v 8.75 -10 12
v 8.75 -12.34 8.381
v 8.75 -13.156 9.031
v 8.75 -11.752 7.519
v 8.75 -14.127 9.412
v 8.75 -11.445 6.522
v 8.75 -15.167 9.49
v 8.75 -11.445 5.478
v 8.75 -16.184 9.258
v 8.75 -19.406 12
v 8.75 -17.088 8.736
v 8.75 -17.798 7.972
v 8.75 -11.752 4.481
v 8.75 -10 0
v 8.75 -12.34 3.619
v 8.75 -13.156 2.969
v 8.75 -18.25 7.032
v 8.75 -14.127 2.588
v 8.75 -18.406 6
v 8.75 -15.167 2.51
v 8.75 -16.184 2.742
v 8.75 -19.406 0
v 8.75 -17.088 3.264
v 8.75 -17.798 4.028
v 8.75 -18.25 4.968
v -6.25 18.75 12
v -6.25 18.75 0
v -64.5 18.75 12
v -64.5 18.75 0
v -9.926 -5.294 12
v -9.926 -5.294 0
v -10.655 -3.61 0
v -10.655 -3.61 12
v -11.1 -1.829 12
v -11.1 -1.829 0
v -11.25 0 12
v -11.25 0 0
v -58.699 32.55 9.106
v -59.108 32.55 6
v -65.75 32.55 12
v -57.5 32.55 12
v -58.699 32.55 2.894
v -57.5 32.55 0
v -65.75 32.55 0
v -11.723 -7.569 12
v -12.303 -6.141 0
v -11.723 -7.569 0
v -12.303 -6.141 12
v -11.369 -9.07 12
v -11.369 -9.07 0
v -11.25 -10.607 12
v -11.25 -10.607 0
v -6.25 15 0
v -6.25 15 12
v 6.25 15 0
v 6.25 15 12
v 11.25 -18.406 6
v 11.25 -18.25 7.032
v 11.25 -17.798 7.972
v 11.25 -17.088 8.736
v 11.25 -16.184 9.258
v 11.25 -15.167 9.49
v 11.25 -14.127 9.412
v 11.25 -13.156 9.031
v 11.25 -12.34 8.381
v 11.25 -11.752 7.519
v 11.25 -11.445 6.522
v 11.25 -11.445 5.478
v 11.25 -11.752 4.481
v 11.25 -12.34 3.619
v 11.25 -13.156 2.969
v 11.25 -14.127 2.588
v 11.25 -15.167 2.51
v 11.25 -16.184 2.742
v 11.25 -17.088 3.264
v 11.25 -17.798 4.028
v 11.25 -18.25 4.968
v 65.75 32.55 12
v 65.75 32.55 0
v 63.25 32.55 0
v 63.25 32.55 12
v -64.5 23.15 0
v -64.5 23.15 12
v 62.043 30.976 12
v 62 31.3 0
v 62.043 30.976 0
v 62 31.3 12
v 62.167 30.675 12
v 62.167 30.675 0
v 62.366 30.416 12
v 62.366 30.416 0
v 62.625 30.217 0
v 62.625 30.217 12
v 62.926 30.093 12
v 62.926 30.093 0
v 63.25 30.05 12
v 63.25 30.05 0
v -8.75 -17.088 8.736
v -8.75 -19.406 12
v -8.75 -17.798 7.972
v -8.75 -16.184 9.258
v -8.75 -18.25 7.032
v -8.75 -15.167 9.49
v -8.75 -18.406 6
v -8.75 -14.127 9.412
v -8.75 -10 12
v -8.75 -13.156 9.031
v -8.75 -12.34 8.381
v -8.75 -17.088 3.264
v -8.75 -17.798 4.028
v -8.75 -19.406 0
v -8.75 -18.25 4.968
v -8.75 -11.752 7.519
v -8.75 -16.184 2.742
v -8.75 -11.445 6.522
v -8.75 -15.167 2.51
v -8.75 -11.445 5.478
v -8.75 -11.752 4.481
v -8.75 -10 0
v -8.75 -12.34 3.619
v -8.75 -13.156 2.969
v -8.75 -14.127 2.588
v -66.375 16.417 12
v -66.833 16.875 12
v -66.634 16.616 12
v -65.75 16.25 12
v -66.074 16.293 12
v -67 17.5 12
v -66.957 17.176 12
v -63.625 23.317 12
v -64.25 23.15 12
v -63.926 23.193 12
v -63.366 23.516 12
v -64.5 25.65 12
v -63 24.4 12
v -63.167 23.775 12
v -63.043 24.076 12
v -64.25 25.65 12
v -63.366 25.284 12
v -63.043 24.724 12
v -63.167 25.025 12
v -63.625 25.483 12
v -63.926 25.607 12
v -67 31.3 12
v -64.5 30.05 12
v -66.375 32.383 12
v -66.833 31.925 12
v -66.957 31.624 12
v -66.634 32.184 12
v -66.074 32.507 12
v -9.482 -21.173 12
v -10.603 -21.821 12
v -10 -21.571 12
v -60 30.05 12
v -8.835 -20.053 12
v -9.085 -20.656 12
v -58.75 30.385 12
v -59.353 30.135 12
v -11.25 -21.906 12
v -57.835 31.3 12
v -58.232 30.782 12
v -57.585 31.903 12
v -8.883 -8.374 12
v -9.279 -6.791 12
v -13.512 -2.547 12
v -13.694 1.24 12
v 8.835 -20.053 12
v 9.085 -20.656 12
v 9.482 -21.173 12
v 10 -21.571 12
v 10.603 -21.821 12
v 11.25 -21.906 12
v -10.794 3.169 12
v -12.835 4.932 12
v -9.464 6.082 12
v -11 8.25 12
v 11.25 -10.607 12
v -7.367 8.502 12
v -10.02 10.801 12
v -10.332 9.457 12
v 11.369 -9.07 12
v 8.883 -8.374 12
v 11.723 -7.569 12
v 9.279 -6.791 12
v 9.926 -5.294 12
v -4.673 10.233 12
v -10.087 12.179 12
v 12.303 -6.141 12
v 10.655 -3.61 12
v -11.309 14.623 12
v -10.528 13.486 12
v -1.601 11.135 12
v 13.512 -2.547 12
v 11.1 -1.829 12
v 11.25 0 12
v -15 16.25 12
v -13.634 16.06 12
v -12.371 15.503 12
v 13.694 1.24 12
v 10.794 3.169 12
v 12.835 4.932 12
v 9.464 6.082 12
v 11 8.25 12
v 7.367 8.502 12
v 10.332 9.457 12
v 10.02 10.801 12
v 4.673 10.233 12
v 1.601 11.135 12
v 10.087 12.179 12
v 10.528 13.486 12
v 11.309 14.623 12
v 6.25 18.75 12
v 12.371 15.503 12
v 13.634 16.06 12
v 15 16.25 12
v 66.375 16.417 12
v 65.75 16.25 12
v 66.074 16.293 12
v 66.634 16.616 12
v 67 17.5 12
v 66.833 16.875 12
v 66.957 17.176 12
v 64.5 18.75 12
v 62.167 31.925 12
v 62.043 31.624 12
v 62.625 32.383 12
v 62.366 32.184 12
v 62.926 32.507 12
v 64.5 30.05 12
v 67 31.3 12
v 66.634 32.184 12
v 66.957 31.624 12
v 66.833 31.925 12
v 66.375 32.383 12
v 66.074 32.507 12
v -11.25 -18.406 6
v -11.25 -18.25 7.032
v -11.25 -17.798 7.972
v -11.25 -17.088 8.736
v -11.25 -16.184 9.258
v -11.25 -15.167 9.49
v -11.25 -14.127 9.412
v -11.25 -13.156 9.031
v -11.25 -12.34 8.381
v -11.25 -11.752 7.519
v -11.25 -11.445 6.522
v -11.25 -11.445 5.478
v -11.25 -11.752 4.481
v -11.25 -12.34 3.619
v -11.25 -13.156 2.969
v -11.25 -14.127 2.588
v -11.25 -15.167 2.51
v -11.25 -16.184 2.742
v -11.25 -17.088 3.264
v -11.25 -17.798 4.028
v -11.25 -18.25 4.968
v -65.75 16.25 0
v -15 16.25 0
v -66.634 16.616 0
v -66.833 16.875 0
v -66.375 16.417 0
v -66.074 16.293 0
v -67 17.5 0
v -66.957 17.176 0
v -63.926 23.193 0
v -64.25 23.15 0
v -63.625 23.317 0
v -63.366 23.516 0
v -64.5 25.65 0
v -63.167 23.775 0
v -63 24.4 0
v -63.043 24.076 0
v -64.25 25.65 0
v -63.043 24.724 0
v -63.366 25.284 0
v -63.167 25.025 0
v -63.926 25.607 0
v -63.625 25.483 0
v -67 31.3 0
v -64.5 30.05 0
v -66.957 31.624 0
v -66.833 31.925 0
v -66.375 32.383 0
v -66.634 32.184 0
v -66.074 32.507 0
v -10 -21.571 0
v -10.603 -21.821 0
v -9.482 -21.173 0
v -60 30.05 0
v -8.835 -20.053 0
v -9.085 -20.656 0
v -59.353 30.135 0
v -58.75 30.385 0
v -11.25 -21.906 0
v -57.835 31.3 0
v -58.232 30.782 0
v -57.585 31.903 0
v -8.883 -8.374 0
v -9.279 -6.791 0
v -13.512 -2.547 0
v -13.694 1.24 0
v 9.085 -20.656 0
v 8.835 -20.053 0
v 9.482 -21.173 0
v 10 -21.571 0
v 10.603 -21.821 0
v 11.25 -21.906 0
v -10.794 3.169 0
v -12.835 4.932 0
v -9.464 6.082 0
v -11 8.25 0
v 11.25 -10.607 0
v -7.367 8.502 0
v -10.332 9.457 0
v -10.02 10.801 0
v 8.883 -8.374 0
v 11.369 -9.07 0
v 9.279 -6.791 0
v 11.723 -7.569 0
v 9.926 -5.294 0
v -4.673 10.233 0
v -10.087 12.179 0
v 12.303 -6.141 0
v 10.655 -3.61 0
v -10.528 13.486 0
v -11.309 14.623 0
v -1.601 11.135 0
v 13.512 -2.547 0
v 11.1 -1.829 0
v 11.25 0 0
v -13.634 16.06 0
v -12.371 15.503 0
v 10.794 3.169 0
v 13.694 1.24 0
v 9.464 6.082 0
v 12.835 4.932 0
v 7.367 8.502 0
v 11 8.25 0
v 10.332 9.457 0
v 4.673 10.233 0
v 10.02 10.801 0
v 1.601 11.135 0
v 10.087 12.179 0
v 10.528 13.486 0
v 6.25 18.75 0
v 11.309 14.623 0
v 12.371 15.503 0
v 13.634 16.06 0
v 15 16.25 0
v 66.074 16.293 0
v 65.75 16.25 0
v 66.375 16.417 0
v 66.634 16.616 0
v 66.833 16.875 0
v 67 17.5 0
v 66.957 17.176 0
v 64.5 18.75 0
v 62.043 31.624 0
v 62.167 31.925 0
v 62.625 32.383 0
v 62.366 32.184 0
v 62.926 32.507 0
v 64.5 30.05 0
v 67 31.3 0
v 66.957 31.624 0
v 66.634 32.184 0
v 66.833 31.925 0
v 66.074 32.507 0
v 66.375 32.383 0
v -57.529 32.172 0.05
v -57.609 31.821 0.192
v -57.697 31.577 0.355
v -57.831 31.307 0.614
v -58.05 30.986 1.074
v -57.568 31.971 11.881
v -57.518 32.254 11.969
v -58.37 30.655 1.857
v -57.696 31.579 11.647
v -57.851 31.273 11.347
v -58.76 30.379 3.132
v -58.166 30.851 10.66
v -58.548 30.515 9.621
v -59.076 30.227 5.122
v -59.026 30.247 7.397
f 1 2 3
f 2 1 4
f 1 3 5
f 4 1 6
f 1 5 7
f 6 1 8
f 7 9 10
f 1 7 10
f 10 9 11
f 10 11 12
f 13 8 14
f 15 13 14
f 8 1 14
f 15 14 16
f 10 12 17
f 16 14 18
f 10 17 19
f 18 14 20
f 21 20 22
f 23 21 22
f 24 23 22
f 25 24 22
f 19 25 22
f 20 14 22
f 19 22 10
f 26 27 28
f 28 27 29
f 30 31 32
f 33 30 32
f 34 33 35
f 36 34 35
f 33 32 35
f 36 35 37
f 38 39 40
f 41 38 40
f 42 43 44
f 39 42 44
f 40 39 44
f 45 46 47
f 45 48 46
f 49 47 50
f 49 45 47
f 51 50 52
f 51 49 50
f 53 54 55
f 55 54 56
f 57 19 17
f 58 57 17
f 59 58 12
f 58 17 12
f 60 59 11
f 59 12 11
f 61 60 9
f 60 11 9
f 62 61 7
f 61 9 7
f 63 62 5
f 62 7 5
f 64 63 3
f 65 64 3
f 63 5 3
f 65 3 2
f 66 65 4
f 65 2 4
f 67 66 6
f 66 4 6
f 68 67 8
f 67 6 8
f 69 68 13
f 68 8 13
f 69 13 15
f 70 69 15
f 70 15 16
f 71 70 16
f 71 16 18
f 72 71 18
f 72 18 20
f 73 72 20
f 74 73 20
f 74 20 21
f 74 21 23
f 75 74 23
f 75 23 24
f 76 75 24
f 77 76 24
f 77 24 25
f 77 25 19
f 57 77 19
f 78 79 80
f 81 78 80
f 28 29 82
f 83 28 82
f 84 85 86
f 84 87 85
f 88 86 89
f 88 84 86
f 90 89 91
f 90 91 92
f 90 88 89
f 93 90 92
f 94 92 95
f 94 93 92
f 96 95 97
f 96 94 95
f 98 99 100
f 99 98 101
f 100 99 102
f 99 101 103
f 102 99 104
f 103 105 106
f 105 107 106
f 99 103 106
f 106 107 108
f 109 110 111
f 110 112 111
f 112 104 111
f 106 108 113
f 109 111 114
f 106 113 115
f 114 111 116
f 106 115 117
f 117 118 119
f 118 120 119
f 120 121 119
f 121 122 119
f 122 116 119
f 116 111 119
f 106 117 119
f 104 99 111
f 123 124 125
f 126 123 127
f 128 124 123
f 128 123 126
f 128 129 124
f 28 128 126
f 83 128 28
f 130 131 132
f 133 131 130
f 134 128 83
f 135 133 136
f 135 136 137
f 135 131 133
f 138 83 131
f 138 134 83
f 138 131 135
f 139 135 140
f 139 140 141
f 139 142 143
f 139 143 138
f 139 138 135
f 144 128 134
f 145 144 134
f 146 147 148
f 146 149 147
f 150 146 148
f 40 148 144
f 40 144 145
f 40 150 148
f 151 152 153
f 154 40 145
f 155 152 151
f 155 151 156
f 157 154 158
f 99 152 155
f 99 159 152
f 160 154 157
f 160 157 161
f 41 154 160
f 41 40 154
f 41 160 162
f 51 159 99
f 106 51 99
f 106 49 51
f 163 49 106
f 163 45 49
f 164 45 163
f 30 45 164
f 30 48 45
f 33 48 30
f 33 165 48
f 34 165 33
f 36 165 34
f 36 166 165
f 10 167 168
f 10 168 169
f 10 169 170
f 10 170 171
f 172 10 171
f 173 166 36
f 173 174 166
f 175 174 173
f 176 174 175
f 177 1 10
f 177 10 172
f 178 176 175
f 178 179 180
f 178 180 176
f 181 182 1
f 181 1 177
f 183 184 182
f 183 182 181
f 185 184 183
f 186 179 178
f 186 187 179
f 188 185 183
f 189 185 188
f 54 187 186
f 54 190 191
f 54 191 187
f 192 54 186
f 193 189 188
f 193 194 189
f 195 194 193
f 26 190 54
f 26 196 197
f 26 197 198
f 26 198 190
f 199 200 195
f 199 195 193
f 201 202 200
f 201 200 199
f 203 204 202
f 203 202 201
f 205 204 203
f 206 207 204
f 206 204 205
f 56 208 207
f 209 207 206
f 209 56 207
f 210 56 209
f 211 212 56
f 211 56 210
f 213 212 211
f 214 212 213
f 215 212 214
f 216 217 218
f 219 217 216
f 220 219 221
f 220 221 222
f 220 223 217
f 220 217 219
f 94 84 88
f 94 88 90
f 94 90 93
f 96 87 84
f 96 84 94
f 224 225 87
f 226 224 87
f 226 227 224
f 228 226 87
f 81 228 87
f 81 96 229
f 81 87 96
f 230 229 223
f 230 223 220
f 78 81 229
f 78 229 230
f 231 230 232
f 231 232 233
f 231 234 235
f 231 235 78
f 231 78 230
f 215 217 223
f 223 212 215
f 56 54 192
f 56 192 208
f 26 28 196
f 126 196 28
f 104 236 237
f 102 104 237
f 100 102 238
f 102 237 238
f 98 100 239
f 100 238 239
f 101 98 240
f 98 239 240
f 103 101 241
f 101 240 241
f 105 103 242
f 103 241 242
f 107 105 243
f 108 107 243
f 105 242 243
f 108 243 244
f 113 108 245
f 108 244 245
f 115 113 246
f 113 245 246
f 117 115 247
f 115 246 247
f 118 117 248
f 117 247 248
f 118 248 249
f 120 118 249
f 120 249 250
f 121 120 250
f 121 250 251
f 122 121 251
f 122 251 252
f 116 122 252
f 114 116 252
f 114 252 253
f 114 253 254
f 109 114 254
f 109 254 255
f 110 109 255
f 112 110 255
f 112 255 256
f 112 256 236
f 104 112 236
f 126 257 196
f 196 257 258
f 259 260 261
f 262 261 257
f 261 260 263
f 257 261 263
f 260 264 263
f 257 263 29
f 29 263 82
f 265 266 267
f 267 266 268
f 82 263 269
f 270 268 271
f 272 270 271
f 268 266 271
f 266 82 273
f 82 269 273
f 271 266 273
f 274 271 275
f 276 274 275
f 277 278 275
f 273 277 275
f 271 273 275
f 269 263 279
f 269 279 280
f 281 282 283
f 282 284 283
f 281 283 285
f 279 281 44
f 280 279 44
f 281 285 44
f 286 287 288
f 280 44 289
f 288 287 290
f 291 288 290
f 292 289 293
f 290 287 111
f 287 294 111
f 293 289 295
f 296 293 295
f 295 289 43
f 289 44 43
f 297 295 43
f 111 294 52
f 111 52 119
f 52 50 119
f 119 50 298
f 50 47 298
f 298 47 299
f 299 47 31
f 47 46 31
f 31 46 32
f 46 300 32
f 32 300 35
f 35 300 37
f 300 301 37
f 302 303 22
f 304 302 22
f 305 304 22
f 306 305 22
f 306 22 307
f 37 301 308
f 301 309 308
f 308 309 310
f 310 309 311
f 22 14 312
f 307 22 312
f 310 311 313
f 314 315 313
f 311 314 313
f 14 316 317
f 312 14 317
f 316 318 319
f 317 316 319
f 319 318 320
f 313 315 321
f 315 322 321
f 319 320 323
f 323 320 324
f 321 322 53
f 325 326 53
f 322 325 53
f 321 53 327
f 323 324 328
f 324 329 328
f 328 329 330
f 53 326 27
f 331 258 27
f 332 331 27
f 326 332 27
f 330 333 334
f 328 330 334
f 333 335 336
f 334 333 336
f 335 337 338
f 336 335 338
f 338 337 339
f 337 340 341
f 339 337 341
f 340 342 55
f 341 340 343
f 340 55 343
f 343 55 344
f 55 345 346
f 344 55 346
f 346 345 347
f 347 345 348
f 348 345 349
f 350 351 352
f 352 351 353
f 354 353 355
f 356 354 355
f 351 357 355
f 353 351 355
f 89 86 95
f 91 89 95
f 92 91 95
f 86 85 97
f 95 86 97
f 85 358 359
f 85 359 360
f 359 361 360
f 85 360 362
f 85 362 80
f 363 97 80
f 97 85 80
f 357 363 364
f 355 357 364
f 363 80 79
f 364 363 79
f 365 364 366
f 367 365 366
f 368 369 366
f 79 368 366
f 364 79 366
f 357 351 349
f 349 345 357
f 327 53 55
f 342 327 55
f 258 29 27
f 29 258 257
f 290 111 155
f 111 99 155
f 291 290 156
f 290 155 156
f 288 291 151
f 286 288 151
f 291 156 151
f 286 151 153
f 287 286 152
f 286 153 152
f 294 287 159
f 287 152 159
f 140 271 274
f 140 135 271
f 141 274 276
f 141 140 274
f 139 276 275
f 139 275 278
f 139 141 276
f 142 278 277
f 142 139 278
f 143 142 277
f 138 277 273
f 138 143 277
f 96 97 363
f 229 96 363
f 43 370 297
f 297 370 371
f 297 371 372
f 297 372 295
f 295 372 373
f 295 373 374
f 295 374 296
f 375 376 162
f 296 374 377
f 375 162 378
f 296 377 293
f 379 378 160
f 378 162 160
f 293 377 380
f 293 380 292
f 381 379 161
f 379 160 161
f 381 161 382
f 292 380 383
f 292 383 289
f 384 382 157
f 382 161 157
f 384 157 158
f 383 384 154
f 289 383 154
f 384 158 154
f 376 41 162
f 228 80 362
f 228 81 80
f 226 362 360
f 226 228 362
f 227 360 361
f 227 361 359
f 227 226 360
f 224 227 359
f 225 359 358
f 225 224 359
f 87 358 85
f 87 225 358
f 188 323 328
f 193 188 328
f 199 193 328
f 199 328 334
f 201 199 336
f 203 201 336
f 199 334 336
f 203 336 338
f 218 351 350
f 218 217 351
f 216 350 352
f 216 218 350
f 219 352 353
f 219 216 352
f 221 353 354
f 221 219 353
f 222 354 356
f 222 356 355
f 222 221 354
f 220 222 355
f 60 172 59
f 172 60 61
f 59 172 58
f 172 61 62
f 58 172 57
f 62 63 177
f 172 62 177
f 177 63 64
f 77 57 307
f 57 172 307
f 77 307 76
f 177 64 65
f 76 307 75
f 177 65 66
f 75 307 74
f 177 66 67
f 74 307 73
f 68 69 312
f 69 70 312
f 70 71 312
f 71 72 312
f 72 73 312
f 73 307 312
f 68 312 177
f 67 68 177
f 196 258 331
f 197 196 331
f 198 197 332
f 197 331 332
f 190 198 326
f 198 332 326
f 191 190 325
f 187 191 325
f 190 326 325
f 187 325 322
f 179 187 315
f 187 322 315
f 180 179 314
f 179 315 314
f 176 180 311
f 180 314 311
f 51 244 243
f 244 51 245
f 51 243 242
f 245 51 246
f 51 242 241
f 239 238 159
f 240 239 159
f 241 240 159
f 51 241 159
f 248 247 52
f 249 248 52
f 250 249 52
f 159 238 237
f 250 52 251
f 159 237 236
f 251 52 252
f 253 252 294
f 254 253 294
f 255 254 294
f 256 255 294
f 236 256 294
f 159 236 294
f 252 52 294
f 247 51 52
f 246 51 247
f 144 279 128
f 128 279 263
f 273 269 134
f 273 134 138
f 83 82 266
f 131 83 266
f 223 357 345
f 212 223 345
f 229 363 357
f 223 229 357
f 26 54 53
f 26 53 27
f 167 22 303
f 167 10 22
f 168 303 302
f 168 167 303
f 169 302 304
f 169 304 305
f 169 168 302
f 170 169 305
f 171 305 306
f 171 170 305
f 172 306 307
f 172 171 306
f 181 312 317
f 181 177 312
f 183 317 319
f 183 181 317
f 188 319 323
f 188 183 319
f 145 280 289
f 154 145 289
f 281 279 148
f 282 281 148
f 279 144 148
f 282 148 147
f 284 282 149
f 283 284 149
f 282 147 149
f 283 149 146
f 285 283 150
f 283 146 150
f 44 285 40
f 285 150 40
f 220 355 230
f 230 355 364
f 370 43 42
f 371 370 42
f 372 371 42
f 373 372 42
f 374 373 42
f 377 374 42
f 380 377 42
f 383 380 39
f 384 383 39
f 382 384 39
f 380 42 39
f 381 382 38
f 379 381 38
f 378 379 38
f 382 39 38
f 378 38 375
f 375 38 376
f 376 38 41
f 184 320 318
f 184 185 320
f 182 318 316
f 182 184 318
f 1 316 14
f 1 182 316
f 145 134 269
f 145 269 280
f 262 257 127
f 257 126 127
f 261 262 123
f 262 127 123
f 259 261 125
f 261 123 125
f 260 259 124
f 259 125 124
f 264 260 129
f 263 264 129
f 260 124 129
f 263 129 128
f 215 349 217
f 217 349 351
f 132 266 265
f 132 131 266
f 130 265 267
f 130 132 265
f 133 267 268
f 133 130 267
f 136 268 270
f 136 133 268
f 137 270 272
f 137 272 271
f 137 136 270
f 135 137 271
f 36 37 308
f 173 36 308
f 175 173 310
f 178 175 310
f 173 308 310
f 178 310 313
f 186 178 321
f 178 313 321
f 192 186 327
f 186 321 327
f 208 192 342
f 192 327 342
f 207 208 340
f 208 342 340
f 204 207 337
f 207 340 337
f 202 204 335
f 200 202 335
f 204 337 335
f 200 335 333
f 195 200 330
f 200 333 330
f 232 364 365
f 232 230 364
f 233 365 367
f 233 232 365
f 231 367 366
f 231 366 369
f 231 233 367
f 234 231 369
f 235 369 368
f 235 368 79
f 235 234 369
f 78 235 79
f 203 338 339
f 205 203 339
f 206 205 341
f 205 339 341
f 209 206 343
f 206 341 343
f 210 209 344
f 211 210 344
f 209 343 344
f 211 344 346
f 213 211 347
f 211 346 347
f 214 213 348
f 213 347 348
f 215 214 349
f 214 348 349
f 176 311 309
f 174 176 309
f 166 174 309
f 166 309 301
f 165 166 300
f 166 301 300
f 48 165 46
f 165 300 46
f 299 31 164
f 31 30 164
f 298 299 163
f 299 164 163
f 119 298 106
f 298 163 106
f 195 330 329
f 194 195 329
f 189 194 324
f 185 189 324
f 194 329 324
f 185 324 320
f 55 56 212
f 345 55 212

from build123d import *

# Parameters (mm, degrees)
F0_W      = 1.5
F0_H      = 2.5
F1_DEPTH  = 12
F2_R      = 3.5
F3_DEPTH  = 22.5
F4_R      = 10
F5_R      = 2.49999
F6_R      = 1.24999
F7_W      = 12.5
F7_H      = 3.75
F8_DEPTH  = 12
F10_DEPTH = 2.5


# Not quite as in the source:
# - a fillet or chamfer is up to 0.001 mm smaller than in the source, because OpenCascade refuses the exact size


with BuildPart() as f1:
    # F0 (on Top) → F1 (new body)
    with BuildSketch(Plane.XY):
        with BuildLine():
            ThreePointArc((11.25, 0), (10.6066017178, -3.75), (8.75, -7.0710678119))
            Line((8.75, -7.0710678119), (8.75, -10.6066017178))
            ThreePointArc((8.75, -10.6066017178), (10.0907742727, -9.3401699437), (11.25, -7.9056941504))
            Line((11.25, -7.9056941504), (11.25, 0))
        make_face()
        with BuildLine():
            ThreePointArc((-11.25, 0), (0, 11.25), (11.25, 0))
            Line((11.25, 0), (11.25, -7.9056941504))
            ThreePointArc((11.25, -7.9056941504), (13.748354024, 0.2127478073), (11, 8.25))
            ThreePointArc((11, 8.25), (0, 13.75), (-11, 8.25))
            ThreePointArc((-11, 8.25), (-13.748354024, 0.2127478073), (-11.25, -7.9056941504))
            Line((-11.25, -7.9056941504), (-11.25, 0))
        make_face()
        with BuildLine():
            ThreePointArc((11.25, -7.9056941504), (10.0907742727, -9.3401699437), (8.75, -10.6066017178))
            Line((8.75, -10.6066017178), (8.75, -21.9056941504))
            Line((8.75, -21.9056941504), (11.25, -21.9056941504))
            Line((11.25, -21.9056941504), (11.25, -7.9056941504))
        make_face()
        with BuildLine():
            ThreePointArc((-8.75, -7.0710678119), (-10.6066017178, -3.75), (-11.25, 0))
            Line((-11.25, 0), (-11.25, -7.9056941504))
            ThreePointArc((-11.25, -7.9056941504), (-10.0907742727, -9.3401699437), (-8.75, -10.6066017178))
            Line((-8.75, -10.6066017178), (-8.75, -7.0710678119))
        make_face()
        with BuildLine():
            ThreePointArc((-8.75, -10.6066017178), (-10.0907742727, -9.3401699437), (-11.25, -7.9056941504))
            Line((-11.25, -7.9056941504), (-11.25, -21.9056941504))
            Line((-11.25, -21.9056941504), (-8.75, -21.9056941504))
            Line((-8.75, -21.9056941504), (-8.75, -10.6066017178))
        make_face()
        with BuildLine():
            ThreePointArc((-11, 8.25), (0, 13.75), (11, 8.25))
            ThreePointArc((11, 8.25), (10.527864045, 13.4860679775), (15, 16.25))
            Line((15, 16.25), (-15, 16.25))
            ThreePointArc((-15, 16.25), (-10.527864045, 13.4860679775), (-11, 8.25))
        make_face()
        Polygon((-15, 16.25), (15, 16.25), (64.5, 16.25), (64.5, 18.75), (0, 18.75), (-64.5, 18.75), (-64.5, 23.15), (-64.5, 25.65), (-64.5, 30.05), (-67, 30.05), (-67, 16.25), (-64.5, 16.25), align=None)
        Polygon((64.5, 18.75), (64.5, 16.25), (67, 16.25), (67, 30.05), (64.5, 30.05), align=None)
        Polygon((62, 30.05), (64.5, 30.05), (67, 30.05), (67, 32.55), (62, 32.55), align=None)
        Polygon((-67, 32.55), (-67, 30.05), (-64.5, 30.05), (-57.5, 30.05), (-57.5, 32.55), align=None)
        with Locations((-63.75, 24.4)):
            Rectangle(F0_W, F0_H)
    extrude(amount=F1_DEPTH)

    # F2 (on face) → F3 (cut, through all)
    with BuildSketch(Plane(origin=(-11.25, 0, 0), x_dir=(0, -1, 0), z_dir=(-1, 0, 0))):
        with Locations((14.9056941504, 6)):
            Circle(F2_R)
    extrude(amount=-F3_DEPTH, mode=Mode.SUBTRACT)

    # F4
    f4_edges = [f1.edges().sort_by_distance(p)[0] for p in [
        (-8.75, -7.071068, 6),
        (8.75, -7.071068, 6),
        (-11.25, -7.905694, 6),
        (11.25, -7.905694, 6),
    ]]
    fillet(f4_edges, radius=F4_R)

    # F5 (radius 2.5 in the source; OpenCascade refuses exactly that, so slightly less here)
    f5_edges = [f1.edges().sort_by_distance(p)[0] for p in [
        (-57.5, 30.05, 6),
        (-8.75, -21.905694, 6),
        (8.75, -21.905694, 6),
    ]]
    fillet(f5_edges, radius=F5_R)

    # F6 (radius 1.25 in the source; OpenCascade refuses exactly that, so slightly less here)
    f6_edges = [f1.edges().sort_by_distance(p)[0] for p in [
        (-67, 32.55, 6),
        (-67, 16.25, 6),
        (67, 16.25, 6),
        (-63, 23.15, 6),
        (-63, 25.65, 6),
        (62, 32.55, 6),
        (62, 30.05, 6),
        (67, 32.55, 6),
    ]]
    fillet(f6_edges, radius=F6_R)

    # F7 (on face) → F8 (cut, through all)
    with BuildSketch(Plane.XY.offset(12)):
        with Locations((0, 16.875)):
            Rectangle(F7_W, F7_H)
    extrude(amount=-F8_DEPTH, mode=Mode.SUBTRACT)

    # F9 (on face) → F10 (cut, through all)
    with BuildSketch(Plane(origin=(0, 32.55, 0), x_dir=(-1, 0, 0), z_dir=(0, 1, 0))):
        with BuildLine():
            Line((57.5, 12), (57.5, 0))
            ThreePointArc((57.5, 0), (59.1076951546, 6), (57.5, 12))
        make_face()
    extrude(amount=-F10_DEPTH, mode=Mode.SUBTRACT)


solid = f1.part
